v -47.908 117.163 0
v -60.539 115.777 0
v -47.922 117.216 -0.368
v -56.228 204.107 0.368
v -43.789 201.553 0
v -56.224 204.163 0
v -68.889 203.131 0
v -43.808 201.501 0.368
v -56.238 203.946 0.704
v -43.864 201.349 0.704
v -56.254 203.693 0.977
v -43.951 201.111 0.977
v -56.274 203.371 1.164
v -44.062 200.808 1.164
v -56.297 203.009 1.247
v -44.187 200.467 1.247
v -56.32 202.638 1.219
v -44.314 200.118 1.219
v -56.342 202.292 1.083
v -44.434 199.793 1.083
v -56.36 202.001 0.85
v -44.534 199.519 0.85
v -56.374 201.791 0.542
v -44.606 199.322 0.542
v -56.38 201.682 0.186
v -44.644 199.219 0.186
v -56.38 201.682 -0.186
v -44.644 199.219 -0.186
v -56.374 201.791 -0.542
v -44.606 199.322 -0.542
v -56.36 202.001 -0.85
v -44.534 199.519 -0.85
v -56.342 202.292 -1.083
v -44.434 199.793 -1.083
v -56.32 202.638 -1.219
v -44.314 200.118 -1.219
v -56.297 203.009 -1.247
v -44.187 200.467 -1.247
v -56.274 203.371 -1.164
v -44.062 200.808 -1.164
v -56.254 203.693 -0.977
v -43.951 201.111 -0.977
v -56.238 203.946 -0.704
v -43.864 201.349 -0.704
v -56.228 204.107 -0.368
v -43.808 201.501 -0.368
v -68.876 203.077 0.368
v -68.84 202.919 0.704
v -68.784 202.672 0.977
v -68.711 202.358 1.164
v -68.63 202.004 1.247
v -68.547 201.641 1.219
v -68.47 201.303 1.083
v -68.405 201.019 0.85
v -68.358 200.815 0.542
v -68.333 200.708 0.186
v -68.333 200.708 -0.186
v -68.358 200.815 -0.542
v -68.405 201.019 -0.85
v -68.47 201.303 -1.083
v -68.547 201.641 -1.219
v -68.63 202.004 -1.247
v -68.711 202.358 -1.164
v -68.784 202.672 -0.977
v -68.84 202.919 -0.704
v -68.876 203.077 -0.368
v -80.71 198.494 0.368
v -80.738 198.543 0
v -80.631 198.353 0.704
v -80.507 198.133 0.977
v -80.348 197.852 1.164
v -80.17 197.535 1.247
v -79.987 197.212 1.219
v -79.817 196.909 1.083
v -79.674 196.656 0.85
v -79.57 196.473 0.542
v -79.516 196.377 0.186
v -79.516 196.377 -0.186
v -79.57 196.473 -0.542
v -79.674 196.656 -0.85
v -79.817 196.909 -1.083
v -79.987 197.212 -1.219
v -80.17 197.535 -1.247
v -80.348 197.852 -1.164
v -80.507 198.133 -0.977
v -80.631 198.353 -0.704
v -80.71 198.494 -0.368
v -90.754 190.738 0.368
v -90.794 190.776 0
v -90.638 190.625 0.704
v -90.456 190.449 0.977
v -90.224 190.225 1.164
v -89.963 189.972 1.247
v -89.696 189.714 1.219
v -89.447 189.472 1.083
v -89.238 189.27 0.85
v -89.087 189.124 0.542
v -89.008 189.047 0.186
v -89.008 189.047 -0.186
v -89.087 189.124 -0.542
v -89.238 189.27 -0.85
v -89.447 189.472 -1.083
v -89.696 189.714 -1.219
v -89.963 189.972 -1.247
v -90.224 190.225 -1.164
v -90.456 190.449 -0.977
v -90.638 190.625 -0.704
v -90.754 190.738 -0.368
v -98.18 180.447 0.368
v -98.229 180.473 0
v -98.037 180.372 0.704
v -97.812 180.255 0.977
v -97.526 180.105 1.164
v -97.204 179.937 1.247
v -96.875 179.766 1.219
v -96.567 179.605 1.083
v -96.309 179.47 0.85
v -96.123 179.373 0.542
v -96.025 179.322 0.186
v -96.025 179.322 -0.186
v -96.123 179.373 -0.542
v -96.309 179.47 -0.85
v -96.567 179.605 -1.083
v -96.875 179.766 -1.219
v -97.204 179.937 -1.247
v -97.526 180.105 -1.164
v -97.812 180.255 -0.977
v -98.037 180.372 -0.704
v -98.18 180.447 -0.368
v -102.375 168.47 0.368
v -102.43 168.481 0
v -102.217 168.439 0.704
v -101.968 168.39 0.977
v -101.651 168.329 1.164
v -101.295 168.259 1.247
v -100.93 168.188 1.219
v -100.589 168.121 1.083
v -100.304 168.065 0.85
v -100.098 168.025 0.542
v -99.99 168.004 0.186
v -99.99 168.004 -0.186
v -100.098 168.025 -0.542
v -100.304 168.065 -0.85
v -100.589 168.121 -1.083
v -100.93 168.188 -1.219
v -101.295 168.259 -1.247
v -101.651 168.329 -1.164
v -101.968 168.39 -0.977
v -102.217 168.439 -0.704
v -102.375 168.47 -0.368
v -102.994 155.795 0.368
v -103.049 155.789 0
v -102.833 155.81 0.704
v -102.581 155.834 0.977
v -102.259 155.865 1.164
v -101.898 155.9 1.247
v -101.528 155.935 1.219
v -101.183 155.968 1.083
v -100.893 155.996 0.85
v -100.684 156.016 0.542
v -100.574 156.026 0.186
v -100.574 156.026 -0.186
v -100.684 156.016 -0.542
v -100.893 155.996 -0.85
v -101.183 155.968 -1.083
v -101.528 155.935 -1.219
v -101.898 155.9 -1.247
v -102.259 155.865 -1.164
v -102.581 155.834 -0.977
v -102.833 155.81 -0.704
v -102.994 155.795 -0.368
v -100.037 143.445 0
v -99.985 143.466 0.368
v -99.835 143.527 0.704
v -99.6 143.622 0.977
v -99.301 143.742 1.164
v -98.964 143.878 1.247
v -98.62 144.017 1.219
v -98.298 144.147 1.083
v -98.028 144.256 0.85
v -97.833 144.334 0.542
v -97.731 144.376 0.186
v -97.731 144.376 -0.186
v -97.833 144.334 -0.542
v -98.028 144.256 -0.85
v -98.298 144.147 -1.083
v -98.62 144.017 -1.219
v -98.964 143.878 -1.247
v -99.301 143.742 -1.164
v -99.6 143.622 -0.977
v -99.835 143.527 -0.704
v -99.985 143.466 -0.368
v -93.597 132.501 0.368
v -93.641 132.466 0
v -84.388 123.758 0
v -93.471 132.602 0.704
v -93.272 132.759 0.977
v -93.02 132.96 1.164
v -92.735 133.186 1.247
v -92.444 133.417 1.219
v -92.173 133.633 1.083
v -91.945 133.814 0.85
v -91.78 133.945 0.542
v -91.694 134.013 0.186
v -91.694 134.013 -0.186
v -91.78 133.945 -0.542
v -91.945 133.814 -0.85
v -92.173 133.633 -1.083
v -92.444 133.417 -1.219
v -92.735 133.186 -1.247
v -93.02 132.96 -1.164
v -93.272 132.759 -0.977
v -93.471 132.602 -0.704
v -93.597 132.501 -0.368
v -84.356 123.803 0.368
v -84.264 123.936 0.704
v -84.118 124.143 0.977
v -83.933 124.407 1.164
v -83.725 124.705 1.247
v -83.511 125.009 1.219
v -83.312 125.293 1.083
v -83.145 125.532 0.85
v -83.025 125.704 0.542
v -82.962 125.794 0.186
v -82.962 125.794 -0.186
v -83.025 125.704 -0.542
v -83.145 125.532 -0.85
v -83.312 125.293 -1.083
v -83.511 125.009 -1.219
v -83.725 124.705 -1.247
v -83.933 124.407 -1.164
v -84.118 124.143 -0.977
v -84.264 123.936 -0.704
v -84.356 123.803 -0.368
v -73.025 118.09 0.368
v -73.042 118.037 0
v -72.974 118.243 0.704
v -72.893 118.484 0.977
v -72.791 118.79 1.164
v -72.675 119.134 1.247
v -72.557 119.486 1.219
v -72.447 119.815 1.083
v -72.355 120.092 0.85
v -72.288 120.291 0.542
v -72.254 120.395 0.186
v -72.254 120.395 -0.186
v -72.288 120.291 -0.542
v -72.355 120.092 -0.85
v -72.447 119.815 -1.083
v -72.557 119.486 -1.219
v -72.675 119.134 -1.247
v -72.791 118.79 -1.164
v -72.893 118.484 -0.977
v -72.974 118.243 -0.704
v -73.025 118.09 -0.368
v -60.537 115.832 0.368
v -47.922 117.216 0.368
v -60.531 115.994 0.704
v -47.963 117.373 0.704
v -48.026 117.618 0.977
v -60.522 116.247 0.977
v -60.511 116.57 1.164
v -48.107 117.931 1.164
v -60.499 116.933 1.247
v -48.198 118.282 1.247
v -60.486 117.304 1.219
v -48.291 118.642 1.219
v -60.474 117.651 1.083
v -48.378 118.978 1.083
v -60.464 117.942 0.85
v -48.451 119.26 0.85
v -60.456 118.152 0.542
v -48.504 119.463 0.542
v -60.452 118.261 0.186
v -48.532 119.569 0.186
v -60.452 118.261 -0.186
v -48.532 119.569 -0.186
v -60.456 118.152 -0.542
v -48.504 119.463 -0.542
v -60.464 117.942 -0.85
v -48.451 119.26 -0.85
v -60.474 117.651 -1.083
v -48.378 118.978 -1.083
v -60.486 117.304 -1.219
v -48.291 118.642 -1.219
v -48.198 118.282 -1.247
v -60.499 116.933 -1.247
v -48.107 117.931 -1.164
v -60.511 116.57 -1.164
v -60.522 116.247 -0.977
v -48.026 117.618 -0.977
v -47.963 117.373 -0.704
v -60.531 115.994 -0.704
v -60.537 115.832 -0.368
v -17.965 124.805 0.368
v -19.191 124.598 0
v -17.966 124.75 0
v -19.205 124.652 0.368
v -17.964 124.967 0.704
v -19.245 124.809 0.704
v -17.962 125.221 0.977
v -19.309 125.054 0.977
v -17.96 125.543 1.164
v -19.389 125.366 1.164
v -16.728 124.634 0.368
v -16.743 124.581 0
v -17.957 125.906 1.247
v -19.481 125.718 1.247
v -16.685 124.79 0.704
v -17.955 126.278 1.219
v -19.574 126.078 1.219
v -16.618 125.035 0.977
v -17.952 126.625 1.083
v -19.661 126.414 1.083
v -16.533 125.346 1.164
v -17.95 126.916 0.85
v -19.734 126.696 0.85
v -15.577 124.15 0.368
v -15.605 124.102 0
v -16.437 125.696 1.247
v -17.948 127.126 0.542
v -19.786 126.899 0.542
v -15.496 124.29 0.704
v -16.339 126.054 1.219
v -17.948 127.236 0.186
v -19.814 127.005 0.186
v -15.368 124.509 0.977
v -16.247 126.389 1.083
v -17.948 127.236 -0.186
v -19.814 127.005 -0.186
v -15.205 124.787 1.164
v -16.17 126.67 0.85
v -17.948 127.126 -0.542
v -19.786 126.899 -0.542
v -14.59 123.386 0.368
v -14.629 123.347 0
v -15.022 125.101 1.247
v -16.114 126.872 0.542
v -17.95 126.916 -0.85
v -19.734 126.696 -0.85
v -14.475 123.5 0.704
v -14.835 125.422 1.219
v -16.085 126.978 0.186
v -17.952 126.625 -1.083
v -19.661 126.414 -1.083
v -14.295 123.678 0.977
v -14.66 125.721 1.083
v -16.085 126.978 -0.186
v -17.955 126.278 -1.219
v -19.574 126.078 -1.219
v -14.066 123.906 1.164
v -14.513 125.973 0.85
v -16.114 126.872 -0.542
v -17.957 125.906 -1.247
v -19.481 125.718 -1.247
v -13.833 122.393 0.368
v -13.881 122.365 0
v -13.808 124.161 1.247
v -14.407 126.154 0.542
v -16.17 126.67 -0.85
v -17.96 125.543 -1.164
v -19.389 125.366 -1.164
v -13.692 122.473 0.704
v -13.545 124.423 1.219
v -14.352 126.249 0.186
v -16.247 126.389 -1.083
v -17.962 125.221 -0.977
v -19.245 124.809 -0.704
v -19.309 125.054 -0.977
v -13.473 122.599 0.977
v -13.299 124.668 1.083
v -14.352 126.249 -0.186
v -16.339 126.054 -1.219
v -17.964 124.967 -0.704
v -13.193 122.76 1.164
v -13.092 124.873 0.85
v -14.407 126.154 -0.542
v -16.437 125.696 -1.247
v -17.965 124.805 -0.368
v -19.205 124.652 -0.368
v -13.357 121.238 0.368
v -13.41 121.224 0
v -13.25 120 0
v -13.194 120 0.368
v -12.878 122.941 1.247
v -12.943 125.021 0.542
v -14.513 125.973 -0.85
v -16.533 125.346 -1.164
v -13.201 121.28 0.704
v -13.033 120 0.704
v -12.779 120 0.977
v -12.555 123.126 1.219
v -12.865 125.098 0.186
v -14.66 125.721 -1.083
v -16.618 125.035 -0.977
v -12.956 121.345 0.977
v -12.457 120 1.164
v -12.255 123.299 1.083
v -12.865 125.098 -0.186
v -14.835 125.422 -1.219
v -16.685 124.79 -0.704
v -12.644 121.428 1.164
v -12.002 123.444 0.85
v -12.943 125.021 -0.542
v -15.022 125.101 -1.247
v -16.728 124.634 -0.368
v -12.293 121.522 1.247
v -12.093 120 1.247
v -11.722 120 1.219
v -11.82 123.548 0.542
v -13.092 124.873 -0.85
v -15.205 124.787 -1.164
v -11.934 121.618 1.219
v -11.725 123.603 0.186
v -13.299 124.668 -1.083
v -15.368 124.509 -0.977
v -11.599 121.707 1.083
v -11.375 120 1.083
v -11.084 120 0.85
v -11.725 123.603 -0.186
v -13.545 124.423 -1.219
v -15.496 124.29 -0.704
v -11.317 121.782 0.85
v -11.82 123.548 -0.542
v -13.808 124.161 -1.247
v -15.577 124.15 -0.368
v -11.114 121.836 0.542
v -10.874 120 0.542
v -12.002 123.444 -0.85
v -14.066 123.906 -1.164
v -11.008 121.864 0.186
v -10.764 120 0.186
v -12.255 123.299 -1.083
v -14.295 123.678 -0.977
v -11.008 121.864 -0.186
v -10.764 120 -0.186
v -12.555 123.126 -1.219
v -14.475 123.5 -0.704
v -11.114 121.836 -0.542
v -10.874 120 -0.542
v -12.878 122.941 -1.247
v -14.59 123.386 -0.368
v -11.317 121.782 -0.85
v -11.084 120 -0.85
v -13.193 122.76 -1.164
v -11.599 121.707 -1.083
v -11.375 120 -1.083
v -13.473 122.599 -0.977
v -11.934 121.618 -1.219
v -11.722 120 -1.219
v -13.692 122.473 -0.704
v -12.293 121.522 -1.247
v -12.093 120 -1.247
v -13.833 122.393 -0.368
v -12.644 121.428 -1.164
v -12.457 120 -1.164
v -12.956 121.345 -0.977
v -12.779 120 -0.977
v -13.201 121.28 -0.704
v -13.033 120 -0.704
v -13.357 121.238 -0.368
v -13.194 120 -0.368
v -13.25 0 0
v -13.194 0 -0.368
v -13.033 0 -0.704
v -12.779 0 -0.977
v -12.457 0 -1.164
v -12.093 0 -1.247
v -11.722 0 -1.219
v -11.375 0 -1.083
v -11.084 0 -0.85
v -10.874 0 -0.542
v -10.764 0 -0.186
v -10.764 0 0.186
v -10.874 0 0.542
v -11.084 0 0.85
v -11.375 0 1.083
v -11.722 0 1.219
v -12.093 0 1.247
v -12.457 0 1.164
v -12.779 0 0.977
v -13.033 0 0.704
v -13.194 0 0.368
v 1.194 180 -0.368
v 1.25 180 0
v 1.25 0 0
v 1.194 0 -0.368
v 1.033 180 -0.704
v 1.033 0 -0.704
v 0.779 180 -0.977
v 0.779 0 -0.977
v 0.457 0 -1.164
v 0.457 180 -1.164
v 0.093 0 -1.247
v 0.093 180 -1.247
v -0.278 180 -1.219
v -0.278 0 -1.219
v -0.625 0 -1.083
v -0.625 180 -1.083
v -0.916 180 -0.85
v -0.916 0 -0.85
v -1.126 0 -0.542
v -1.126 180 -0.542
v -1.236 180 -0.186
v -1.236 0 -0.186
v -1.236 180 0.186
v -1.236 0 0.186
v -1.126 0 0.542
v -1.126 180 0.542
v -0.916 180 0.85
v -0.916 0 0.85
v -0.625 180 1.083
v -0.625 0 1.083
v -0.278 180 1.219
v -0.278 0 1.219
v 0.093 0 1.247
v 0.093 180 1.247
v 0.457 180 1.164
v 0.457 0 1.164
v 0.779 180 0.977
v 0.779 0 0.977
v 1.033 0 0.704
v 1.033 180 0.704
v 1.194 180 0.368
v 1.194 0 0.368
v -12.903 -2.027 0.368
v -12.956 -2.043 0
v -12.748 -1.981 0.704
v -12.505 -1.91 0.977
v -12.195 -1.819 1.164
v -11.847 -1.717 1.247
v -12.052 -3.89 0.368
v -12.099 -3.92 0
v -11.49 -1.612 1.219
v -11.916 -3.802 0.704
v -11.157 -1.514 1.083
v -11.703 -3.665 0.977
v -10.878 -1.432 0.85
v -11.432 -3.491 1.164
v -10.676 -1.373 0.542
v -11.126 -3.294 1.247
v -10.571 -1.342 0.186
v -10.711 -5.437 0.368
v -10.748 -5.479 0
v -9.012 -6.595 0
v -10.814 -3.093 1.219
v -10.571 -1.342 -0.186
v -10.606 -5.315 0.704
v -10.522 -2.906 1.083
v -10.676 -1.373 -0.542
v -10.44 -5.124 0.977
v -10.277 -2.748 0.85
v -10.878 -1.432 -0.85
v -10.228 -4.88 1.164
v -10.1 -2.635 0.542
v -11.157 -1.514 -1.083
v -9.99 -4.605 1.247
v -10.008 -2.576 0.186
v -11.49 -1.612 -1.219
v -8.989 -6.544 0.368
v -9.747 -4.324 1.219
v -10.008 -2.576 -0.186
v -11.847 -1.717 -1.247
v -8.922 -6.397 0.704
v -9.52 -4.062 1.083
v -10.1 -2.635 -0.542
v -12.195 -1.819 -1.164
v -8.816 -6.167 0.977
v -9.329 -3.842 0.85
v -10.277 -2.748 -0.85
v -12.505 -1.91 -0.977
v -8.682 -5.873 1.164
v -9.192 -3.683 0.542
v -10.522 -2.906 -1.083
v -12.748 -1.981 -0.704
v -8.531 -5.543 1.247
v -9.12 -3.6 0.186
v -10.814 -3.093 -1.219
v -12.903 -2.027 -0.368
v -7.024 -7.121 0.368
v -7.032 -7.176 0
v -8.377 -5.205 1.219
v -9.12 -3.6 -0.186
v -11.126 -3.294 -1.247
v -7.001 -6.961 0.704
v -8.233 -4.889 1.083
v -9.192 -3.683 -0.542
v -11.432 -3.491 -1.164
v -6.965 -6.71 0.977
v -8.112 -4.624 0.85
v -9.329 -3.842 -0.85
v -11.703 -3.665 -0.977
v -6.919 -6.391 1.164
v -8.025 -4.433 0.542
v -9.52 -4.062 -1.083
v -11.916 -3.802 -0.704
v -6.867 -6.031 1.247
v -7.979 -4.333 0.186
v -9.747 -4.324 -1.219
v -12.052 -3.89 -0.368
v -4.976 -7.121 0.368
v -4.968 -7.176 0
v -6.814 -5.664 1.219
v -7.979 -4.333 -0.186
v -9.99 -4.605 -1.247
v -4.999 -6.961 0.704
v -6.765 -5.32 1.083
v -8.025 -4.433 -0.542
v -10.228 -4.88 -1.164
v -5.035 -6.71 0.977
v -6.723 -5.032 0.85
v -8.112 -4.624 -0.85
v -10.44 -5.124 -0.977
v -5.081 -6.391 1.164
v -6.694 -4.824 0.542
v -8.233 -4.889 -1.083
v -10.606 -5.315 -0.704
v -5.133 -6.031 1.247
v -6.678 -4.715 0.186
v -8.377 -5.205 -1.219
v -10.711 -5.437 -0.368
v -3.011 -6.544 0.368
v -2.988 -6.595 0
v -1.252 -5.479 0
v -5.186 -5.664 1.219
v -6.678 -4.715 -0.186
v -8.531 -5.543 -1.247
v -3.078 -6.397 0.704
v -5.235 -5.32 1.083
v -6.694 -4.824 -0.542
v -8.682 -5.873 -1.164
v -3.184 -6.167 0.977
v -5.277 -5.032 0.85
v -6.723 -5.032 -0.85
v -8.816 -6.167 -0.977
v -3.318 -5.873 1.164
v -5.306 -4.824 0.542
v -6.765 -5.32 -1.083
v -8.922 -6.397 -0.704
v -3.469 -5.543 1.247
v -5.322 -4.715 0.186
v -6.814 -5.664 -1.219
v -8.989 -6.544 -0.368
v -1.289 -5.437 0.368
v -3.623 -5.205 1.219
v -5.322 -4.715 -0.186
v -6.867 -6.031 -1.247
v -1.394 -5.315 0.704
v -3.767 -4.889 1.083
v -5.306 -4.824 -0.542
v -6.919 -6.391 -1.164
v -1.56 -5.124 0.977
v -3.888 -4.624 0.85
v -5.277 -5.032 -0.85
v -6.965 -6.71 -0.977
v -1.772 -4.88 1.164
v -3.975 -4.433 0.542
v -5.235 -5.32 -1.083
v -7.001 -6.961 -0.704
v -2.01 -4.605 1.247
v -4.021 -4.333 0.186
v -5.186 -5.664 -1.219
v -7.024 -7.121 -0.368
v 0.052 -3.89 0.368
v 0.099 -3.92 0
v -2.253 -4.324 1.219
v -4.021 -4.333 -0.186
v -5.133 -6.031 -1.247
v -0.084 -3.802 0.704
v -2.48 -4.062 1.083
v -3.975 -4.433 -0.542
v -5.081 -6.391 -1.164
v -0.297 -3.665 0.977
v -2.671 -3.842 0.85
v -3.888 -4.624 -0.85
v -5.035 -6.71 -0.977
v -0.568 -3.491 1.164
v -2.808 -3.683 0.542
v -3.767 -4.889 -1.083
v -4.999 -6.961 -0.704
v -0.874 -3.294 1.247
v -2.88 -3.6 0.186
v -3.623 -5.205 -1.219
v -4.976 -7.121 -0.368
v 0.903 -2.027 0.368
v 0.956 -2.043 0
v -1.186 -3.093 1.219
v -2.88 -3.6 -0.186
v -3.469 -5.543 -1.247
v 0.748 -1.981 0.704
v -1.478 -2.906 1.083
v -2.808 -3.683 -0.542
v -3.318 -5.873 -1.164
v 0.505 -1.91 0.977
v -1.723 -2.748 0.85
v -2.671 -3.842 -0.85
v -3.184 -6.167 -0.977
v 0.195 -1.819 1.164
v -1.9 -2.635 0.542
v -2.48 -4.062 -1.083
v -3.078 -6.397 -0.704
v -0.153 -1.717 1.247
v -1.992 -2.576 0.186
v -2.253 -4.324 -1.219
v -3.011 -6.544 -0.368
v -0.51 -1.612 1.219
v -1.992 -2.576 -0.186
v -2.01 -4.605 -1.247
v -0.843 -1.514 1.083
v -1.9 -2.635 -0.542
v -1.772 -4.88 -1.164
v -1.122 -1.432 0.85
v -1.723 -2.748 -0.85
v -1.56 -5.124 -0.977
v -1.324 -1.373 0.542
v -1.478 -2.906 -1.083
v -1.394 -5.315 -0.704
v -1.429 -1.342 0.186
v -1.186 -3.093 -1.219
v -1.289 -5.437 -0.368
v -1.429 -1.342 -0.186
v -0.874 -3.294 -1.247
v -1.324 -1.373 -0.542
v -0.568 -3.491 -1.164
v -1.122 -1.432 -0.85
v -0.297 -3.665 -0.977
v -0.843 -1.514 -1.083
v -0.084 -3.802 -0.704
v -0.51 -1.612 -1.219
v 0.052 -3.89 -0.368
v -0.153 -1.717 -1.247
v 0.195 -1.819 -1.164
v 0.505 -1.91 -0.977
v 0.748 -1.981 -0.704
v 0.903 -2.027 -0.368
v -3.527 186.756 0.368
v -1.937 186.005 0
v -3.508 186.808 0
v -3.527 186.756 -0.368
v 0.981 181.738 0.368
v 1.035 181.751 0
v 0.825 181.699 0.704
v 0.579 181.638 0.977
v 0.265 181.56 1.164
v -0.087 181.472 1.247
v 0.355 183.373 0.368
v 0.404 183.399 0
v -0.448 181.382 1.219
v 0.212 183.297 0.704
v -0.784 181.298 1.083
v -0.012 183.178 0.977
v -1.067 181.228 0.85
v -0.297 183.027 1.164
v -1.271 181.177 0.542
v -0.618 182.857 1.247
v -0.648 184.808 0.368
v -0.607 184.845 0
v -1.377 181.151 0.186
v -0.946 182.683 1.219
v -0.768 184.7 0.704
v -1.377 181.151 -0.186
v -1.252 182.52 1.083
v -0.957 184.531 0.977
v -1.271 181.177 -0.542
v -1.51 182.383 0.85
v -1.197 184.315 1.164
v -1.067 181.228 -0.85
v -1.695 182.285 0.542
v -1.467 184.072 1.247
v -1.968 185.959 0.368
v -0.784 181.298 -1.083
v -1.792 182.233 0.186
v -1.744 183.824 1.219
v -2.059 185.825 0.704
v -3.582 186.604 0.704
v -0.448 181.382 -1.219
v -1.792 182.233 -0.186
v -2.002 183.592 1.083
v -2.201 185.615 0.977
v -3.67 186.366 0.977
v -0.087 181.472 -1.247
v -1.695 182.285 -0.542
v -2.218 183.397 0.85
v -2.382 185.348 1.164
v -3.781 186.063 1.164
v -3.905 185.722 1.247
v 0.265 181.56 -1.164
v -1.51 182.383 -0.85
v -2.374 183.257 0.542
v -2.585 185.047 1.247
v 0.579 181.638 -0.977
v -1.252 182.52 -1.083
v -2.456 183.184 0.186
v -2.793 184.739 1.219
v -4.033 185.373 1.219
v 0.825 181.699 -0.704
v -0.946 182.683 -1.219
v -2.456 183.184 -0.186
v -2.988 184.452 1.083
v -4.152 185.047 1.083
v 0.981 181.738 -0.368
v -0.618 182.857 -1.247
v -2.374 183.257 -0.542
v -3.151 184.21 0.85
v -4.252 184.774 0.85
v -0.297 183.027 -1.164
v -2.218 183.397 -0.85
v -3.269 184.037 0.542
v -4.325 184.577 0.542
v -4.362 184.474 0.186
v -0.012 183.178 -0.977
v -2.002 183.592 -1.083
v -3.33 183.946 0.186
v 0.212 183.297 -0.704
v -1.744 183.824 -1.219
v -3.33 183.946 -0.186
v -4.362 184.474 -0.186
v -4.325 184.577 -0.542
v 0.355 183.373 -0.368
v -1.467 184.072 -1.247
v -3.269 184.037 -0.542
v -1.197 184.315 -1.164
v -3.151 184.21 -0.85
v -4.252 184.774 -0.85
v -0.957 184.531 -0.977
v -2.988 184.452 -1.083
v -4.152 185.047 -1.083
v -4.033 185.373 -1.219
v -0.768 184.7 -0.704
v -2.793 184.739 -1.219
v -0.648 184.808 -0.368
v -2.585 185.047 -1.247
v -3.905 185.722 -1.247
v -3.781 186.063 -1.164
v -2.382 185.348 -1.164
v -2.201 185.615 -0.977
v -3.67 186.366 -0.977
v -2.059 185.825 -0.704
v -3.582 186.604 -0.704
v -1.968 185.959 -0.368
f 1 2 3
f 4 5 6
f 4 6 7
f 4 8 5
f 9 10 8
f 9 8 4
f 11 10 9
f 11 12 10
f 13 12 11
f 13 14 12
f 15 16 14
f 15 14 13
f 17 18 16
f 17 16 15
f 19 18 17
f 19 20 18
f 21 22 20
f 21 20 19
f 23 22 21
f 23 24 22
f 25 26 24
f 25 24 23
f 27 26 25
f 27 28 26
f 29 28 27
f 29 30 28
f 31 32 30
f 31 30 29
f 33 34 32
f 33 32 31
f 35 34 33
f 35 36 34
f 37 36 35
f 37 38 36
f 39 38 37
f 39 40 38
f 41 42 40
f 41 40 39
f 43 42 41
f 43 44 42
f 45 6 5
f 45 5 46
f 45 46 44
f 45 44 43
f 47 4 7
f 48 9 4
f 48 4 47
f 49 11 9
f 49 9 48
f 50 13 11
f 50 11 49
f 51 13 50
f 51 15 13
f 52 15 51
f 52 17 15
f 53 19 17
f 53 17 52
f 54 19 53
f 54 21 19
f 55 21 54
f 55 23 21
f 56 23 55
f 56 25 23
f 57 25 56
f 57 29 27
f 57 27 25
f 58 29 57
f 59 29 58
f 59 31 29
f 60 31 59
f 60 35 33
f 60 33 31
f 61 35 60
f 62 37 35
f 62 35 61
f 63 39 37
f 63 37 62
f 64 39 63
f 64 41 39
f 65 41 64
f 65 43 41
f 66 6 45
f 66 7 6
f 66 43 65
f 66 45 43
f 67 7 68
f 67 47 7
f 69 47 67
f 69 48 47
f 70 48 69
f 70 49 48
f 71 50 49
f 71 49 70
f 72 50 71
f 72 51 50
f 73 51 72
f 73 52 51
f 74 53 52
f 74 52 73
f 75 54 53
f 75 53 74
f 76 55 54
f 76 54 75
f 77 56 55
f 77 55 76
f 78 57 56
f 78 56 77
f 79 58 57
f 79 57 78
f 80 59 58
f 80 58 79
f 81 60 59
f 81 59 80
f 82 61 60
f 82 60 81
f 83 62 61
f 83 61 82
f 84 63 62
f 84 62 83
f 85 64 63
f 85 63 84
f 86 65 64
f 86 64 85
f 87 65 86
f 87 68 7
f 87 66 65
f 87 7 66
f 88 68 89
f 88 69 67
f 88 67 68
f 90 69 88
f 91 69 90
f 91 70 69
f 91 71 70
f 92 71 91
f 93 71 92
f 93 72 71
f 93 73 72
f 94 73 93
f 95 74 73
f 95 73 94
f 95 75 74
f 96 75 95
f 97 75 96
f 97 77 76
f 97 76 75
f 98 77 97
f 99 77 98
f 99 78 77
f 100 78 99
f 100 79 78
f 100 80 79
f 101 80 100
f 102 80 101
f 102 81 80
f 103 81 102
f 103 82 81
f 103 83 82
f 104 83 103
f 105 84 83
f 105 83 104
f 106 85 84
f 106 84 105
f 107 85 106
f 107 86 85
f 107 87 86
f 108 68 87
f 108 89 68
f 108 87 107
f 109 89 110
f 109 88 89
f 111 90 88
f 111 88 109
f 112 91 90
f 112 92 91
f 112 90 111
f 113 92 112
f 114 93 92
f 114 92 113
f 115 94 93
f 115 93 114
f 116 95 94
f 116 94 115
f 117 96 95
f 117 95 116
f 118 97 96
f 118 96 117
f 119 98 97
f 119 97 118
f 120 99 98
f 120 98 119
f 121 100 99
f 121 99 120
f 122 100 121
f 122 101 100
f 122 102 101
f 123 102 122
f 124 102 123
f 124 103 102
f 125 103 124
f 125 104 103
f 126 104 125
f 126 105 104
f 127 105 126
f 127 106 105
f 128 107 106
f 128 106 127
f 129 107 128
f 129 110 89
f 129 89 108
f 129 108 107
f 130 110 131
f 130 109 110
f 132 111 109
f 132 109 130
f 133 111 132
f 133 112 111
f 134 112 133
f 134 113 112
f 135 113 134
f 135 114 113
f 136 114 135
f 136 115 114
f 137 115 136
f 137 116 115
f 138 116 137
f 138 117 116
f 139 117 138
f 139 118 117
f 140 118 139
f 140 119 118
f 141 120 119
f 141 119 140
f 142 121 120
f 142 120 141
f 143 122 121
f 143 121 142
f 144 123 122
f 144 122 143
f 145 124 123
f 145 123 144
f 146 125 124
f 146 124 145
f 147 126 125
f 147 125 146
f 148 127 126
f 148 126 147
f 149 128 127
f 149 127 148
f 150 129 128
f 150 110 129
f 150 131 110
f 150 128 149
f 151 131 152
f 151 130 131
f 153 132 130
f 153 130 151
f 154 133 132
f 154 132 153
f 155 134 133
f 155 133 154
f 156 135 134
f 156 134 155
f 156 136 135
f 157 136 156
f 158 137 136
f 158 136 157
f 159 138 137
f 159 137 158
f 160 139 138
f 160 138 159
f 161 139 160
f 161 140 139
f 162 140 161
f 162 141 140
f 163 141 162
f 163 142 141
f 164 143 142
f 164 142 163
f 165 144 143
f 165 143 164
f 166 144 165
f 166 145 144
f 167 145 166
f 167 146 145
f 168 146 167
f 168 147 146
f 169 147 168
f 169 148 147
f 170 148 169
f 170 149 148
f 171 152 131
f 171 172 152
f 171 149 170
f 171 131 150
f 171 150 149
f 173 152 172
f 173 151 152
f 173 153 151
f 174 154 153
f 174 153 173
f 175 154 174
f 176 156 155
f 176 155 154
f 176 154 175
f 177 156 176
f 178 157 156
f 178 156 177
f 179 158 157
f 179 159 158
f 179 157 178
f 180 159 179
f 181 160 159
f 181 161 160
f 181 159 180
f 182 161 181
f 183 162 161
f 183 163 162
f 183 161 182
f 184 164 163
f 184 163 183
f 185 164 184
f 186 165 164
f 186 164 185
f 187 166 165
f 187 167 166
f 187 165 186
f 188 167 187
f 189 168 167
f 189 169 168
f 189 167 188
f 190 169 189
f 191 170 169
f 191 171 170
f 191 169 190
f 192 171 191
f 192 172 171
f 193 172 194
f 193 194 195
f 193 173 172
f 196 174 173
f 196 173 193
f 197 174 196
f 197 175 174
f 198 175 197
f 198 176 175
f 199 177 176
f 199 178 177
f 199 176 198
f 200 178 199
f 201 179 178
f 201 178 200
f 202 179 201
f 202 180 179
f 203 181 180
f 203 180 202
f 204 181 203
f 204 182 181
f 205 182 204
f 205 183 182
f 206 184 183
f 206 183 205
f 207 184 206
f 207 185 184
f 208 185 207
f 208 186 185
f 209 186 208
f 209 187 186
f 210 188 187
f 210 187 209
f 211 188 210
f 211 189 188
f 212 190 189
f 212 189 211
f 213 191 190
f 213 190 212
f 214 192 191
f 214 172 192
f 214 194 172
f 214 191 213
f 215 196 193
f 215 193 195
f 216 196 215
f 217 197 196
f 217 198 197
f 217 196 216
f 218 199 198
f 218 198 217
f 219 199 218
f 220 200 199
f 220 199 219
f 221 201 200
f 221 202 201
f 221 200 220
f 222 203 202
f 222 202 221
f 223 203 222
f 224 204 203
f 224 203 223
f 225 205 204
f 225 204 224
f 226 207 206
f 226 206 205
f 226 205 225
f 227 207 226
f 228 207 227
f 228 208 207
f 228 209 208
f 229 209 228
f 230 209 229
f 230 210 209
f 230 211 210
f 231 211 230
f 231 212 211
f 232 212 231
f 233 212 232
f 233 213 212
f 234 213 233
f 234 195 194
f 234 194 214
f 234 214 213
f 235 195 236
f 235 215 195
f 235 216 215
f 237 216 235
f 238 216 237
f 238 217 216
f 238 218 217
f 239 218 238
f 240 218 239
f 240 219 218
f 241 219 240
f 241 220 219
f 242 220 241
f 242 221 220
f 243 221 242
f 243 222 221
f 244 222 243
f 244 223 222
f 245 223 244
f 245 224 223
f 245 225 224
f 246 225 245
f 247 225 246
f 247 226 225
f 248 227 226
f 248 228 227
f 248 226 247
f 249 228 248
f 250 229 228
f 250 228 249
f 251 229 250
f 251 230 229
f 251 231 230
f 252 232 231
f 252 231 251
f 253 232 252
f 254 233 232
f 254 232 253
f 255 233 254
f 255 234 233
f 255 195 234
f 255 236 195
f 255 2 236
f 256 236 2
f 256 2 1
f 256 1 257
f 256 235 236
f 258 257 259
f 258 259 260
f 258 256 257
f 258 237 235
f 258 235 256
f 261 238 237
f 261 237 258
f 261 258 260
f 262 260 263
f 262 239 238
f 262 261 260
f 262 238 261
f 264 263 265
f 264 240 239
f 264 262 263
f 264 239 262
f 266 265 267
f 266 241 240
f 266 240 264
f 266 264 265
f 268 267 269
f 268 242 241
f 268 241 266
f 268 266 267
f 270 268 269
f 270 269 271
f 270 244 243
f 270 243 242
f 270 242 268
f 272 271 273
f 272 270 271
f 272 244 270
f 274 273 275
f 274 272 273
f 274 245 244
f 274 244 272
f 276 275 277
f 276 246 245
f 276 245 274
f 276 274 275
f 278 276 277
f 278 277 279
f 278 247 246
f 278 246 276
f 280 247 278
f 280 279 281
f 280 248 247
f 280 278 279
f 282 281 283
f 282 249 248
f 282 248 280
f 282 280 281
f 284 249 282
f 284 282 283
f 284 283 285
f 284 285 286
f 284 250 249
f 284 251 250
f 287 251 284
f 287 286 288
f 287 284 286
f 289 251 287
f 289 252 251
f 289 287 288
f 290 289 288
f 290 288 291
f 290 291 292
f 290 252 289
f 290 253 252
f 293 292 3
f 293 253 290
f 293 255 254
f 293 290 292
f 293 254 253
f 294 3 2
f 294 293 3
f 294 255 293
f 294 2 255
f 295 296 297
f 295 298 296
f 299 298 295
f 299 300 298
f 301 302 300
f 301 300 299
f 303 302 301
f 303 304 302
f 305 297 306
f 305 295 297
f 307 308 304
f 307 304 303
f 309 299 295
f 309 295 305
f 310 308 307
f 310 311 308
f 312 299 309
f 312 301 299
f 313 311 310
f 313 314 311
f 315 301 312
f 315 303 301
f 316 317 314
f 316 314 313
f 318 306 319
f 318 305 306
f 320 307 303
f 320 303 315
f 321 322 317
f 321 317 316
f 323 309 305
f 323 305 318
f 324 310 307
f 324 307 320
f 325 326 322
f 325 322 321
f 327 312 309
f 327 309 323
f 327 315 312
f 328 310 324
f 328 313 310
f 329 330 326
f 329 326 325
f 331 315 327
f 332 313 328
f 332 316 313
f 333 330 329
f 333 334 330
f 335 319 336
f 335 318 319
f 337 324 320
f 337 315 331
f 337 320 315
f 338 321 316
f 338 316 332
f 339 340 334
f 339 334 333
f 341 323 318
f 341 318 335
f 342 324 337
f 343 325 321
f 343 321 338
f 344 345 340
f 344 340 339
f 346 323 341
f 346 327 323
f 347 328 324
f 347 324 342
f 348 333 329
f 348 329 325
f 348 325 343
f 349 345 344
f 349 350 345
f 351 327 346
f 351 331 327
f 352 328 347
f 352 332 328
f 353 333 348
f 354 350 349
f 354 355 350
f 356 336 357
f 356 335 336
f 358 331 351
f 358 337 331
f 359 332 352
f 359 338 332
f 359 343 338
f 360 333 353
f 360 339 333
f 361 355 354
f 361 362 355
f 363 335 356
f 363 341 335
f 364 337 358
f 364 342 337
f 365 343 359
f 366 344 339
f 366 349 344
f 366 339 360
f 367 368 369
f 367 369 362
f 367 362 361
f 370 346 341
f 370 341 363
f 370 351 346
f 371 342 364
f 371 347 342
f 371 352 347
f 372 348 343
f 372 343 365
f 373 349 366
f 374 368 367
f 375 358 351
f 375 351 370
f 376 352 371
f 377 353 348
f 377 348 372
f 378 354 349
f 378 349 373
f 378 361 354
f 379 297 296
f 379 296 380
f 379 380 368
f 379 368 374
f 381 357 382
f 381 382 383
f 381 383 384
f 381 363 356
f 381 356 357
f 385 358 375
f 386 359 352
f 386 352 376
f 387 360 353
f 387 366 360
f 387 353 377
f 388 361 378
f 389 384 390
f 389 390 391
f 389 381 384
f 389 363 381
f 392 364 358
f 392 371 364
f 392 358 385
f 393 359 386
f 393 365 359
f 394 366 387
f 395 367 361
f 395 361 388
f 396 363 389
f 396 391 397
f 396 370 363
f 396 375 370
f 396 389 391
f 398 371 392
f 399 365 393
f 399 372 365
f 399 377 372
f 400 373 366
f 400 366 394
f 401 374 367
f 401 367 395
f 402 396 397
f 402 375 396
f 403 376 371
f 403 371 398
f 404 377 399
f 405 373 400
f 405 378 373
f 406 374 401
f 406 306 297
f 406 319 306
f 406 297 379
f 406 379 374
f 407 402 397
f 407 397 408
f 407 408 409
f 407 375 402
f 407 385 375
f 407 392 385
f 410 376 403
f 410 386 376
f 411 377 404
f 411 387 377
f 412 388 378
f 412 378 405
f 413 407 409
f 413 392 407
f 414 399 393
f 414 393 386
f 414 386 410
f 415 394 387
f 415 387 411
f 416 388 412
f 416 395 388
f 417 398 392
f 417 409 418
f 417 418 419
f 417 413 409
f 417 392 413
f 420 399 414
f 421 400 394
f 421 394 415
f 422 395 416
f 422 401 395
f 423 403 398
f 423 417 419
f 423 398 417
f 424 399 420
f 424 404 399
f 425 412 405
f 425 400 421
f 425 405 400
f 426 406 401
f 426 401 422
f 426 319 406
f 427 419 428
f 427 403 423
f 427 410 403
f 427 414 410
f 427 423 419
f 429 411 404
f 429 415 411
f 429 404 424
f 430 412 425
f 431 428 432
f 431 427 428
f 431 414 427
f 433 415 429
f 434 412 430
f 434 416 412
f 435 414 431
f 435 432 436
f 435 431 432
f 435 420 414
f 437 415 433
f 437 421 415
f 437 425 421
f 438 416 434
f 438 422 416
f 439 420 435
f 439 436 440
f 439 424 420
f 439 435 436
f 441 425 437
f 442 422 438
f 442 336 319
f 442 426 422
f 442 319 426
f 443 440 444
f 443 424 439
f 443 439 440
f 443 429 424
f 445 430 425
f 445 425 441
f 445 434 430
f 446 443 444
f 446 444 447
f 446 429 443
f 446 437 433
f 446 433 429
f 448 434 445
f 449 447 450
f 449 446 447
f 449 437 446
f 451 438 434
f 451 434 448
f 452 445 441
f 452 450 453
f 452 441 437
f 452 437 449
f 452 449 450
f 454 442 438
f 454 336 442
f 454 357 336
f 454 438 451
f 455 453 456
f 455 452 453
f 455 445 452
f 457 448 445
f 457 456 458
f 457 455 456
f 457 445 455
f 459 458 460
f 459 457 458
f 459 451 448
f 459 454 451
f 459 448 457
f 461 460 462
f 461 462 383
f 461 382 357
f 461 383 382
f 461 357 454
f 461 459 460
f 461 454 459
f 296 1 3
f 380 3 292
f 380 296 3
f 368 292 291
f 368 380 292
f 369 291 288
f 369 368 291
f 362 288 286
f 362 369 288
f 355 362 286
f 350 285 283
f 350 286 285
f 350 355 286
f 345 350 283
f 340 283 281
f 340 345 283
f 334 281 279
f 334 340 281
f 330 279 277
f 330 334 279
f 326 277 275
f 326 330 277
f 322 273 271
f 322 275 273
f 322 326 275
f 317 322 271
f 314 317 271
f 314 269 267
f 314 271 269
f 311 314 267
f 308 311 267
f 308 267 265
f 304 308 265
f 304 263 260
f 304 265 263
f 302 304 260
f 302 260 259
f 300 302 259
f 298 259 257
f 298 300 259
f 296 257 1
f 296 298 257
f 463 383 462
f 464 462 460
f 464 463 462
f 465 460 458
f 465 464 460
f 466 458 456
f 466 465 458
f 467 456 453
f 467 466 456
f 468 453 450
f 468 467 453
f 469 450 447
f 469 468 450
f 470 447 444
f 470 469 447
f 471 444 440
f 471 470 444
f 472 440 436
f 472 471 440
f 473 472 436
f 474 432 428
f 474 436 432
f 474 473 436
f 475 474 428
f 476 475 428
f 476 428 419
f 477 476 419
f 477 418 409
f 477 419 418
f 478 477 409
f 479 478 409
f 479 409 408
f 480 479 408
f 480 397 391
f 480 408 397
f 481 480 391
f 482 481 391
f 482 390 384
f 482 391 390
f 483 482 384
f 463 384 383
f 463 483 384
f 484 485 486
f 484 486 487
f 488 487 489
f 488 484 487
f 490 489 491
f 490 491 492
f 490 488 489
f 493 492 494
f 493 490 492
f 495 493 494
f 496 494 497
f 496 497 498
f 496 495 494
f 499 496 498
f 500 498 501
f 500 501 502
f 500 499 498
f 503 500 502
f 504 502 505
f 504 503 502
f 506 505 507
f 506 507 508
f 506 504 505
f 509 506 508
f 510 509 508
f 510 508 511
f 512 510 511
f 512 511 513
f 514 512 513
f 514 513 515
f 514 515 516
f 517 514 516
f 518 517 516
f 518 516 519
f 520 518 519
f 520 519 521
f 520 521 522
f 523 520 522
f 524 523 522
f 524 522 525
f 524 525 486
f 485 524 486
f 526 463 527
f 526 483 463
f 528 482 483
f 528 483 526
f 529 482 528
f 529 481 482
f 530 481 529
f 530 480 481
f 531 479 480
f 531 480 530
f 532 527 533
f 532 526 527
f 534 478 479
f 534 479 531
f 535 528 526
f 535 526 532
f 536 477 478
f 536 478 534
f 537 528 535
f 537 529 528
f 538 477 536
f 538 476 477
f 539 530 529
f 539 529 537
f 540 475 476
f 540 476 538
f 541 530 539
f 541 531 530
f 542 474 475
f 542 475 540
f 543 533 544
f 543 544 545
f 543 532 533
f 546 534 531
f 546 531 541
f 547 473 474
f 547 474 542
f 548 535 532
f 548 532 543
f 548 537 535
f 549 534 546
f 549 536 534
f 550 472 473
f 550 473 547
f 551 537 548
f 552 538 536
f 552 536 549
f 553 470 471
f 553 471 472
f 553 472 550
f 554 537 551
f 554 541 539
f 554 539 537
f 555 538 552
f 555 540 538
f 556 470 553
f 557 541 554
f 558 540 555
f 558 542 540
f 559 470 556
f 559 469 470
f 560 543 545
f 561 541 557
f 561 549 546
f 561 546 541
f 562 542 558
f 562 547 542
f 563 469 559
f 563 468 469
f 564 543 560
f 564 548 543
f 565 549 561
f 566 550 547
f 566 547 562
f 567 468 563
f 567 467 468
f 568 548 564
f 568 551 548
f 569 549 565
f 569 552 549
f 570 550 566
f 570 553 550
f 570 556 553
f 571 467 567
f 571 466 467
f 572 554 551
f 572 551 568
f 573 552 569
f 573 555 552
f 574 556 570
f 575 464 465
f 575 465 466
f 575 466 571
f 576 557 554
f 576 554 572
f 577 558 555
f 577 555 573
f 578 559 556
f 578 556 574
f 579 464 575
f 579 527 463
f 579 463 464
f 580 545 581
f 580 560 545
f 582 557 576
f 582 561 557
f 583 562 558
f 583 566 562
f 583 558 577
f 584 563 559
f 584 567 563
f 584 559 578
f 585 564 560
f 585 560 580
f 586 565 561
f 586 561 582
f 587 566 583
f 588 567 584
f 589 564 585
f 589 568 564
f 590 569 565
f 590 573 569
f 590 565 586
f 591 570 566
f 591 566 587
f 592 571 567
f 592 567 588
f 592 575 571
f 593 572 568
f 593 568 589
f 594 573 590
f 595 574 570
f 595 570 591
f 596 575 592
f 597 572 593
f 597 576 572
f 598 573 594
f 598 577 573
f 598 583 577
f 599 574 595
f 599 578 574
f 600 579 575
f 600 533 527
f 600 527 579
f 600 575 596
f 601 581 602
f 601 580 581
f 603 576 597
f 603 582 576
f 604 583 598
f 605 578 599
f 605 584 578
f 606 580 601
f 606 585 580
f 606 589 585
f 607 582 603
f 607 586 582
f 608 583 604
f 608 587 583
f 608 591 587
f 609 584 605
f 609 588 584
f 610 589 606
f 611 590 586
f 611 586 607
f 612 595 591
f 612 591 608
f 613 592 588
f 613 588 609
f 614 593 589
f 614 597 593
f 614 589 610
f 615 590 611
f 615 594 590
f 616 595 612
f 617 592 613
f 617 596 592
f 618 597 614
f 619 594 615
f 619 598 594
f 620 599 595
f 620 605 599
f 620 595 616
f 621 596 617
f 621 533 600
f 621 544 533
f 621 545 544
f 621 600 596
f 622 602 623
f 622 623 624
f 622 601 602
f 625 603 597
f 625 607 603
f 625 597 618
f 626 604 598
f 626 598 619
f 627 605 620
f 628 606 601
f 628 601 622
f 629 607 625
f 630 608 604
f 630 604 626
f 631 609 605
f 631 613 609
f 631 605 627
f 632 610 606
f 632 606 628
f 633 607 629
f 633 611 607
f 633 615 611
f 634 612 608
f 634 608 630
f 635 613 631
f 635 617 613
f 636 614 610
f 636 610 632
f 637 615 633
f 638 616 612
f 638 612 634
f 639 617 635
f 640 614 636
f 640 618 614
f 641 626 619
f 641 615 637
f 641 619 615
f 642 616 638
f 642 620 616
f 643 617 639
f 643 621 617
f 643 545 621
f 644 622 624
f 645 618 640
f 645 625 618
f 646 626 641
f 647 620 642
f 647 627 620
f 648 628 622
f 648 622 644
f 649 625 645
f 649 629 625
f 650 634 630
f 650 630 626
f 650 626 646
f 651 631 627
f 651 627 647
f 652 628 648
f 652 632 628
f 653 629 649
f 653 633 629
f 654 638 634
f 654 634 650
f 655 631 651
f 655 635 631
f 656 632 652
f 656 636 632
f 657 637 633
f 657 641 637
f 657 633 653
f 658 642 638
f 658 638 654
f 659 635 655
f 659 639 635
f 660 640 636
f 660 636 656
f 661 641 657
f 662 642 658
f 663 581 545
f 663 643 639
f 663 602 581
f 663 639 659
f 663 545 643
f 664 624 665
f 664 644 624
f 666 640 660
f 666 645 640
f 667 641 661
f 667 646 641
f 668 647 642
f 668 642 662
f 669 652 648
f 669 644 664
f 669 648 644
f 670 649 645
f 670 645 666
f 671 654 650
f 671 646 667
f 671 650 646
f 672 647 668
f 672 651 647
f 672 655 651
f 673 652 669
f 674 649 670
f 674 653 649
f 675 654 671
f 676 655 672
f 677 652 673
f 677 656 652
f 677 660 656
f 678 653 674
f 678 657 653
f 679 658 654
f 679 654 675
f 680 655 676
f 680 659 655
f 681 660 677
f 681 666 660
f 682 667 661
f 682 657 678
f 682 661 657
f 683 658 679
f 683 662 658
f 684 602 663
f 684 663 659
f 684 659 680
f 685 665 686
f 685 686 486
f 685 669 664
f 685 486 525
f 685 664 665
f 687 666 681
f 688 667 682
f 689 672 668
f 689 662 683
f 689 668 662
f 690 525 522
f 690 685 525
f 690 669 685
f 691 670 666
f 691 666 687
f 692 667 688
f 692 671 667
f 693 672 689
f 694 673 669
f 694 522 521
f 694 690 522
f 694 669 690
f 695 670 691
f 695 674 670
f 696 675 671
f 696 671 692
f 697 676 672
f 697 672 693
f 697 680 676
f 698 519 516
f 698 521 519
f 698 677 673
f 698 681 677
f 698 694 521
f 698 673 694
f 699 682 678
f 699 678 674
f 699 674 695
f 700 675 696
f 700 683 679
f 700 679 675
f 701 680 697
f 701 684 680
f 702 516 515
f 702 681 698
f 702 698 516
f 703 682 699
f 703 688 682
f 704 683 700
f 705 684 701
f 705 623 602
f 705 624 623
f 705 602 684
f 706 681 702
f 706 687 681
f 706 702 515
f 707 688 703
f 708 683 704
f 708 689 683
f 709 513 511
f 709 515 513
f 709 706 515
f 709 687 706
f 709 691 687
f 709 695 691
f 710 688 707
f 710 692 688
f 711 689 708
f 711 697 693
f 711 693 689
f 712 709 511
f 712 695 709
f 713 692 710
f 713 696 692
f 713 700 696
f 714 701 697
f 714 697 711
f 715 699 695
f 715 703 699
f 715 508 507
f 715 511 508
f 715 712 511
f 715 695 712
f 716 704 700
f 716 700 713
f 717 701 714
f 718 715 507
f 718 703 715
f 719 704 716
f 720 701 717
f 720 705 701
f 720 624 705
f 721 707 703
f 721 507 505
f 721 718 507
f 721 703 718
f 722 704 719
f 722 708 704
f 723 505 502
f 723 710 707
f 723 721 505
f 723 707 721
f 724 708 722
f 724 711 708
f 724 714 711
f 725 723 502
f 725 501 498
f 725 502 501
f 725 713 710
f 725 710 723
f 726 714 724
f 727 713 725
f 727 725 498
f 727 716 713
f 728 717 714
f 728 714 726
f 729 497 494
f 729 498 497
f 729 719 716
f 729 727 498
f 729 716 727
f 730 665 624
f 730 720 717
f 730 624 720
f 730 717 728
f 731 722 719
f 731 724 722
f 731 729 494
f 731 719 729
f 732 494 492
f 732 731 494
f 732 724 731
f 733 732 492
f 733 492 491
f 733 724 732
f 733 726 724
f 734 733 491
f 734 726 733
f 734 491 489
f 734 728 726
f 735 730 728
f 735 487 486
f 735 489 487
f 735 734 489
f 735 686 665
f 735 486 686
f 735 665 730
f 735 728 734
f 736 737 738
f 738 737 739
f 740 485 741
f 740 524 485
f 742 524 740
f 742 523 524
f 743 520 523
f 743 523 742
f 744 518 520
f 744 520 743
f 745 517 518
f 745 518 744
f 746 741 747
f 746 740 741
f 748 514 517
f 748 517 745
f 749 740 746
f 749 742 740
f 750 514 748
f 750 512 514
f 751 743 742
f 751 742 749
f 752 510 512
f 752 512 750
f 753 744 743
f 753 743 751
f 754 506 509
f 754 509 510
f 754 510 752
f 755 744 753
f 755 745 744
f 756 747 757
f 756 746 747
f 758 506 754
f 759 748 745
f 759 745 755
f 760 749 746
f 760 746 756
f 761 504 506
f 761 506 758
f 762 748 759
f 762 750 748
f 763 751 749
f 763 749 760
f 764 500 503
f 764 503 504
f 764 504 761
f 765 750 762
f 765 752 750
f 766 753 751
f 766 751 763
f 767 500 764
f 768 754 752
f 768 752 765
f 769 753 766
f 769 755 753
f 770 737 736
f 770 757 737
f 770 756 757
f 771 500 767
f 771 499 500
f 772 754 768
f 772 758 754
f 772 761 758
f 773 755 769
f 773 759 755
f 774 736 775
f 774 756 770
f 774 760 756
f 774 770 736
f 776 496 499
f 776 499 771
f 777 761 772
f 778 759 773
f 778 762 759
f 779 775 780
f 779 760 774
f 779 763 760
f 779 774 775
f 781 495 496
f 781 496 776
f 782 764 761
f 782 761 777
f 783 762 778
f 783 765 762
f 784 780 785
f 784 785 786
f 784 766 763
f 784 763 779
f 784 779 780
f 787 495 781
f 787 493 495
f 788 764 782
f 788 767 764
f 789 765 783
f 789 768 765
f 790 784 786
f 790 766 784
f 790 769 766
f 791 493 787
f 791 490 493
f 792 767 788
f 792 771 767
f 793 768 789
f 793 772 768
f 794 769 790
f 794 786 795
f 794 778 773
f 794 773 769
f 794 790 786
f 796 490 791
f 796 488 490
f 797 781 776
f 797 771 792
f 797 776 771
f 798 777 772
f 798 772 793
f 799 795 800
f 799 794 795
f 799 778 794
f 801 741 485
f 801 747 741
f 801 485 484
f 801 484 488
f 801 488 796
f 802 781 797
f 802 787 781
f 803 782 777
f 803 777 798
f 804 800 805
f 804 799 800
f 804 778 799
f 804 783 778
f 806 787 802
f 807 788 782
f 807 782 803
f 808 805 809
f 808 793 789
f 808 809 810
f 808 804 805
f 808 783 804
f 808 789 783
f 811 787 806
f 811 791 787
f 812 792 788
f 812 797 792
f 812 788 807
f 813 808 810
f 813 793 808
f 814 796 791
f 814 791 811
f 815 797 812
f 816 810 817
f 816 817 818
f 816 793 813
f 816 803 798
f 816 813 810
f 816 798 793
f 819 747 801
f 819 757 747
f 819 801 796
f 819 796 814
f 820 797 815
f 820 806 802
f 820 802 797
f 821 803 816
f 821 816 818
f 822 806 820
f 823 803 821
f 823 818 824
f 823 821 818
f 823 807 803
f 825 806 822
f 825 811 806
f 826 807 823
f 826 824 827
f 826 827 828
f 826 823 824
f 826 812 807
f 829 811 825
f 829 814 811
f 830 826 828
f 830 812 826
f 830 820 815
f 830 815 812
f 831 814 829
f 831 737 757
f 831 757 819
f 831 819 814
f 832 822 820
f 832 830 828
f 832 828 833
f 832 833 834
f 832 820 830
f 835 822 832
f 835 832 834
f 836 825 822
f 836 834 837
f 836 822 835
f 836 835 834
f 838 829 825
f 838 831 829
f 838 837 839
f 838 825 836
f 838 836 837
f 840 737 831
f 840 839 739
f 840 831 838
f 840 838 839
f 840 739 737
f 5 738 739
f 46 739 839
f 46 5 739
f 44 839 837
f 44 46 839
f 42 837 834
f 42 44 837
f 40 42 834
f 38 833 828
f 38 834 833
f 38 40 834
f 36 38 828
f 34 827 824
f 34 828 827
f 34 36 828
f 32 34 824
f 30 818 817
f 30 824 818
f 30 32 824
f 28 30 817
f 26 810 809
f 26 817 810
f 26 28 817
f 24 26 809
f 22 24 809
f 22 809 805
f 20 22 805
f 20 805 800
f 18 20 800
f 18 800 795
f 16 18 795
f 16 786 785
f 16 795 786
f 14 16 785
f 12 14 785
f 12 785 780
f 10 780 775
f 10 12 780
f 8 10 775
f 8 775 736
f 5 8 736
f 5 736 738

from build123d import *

# Parameters (mm, degrees)
ESQUISSE1_R = 1.25


with BuildPart() as part:
    # Balayage1: sweep along a path in Esquisse2
    with BuildLine(Plane.XY) as balayage1_path:
        Line((0, 0), (0, 180))
        ThreePointArc((0, 180), (-1.081920065, 183.436930281), (-3.937496585, 185.63436595))
        Line((-3.937496585, 185.63436595), (-44.218725526, 200.379622645))
        ThreePointArc((-44.218725526, 200.379622645), (-101.948863448, 162.096456184), (-48.221714597, 118.372742539))
        Line((-48.221714597, 118.372742539), (-19.5039468, 125.80845453))
        ThreePointArc((-19.5039468, 125.80845453), (-14.327377014, 124.744664414), (-12, 120))
        Line((-12, 120), (-12, 0))
        ThreePointArc((-12, 0), (-6, -6), (0, 0))
    # Esquisse1 → Balayage1 (sweep)
    with BuildSketch(Plane(origin=(0, 0, 0), x_dir=(1, 0, 0), z_dir=(0, 1, 0))):
        Circle(ESQUISSE1_R)
    sweep(path=balayage1_path.line)


solid = part.part
